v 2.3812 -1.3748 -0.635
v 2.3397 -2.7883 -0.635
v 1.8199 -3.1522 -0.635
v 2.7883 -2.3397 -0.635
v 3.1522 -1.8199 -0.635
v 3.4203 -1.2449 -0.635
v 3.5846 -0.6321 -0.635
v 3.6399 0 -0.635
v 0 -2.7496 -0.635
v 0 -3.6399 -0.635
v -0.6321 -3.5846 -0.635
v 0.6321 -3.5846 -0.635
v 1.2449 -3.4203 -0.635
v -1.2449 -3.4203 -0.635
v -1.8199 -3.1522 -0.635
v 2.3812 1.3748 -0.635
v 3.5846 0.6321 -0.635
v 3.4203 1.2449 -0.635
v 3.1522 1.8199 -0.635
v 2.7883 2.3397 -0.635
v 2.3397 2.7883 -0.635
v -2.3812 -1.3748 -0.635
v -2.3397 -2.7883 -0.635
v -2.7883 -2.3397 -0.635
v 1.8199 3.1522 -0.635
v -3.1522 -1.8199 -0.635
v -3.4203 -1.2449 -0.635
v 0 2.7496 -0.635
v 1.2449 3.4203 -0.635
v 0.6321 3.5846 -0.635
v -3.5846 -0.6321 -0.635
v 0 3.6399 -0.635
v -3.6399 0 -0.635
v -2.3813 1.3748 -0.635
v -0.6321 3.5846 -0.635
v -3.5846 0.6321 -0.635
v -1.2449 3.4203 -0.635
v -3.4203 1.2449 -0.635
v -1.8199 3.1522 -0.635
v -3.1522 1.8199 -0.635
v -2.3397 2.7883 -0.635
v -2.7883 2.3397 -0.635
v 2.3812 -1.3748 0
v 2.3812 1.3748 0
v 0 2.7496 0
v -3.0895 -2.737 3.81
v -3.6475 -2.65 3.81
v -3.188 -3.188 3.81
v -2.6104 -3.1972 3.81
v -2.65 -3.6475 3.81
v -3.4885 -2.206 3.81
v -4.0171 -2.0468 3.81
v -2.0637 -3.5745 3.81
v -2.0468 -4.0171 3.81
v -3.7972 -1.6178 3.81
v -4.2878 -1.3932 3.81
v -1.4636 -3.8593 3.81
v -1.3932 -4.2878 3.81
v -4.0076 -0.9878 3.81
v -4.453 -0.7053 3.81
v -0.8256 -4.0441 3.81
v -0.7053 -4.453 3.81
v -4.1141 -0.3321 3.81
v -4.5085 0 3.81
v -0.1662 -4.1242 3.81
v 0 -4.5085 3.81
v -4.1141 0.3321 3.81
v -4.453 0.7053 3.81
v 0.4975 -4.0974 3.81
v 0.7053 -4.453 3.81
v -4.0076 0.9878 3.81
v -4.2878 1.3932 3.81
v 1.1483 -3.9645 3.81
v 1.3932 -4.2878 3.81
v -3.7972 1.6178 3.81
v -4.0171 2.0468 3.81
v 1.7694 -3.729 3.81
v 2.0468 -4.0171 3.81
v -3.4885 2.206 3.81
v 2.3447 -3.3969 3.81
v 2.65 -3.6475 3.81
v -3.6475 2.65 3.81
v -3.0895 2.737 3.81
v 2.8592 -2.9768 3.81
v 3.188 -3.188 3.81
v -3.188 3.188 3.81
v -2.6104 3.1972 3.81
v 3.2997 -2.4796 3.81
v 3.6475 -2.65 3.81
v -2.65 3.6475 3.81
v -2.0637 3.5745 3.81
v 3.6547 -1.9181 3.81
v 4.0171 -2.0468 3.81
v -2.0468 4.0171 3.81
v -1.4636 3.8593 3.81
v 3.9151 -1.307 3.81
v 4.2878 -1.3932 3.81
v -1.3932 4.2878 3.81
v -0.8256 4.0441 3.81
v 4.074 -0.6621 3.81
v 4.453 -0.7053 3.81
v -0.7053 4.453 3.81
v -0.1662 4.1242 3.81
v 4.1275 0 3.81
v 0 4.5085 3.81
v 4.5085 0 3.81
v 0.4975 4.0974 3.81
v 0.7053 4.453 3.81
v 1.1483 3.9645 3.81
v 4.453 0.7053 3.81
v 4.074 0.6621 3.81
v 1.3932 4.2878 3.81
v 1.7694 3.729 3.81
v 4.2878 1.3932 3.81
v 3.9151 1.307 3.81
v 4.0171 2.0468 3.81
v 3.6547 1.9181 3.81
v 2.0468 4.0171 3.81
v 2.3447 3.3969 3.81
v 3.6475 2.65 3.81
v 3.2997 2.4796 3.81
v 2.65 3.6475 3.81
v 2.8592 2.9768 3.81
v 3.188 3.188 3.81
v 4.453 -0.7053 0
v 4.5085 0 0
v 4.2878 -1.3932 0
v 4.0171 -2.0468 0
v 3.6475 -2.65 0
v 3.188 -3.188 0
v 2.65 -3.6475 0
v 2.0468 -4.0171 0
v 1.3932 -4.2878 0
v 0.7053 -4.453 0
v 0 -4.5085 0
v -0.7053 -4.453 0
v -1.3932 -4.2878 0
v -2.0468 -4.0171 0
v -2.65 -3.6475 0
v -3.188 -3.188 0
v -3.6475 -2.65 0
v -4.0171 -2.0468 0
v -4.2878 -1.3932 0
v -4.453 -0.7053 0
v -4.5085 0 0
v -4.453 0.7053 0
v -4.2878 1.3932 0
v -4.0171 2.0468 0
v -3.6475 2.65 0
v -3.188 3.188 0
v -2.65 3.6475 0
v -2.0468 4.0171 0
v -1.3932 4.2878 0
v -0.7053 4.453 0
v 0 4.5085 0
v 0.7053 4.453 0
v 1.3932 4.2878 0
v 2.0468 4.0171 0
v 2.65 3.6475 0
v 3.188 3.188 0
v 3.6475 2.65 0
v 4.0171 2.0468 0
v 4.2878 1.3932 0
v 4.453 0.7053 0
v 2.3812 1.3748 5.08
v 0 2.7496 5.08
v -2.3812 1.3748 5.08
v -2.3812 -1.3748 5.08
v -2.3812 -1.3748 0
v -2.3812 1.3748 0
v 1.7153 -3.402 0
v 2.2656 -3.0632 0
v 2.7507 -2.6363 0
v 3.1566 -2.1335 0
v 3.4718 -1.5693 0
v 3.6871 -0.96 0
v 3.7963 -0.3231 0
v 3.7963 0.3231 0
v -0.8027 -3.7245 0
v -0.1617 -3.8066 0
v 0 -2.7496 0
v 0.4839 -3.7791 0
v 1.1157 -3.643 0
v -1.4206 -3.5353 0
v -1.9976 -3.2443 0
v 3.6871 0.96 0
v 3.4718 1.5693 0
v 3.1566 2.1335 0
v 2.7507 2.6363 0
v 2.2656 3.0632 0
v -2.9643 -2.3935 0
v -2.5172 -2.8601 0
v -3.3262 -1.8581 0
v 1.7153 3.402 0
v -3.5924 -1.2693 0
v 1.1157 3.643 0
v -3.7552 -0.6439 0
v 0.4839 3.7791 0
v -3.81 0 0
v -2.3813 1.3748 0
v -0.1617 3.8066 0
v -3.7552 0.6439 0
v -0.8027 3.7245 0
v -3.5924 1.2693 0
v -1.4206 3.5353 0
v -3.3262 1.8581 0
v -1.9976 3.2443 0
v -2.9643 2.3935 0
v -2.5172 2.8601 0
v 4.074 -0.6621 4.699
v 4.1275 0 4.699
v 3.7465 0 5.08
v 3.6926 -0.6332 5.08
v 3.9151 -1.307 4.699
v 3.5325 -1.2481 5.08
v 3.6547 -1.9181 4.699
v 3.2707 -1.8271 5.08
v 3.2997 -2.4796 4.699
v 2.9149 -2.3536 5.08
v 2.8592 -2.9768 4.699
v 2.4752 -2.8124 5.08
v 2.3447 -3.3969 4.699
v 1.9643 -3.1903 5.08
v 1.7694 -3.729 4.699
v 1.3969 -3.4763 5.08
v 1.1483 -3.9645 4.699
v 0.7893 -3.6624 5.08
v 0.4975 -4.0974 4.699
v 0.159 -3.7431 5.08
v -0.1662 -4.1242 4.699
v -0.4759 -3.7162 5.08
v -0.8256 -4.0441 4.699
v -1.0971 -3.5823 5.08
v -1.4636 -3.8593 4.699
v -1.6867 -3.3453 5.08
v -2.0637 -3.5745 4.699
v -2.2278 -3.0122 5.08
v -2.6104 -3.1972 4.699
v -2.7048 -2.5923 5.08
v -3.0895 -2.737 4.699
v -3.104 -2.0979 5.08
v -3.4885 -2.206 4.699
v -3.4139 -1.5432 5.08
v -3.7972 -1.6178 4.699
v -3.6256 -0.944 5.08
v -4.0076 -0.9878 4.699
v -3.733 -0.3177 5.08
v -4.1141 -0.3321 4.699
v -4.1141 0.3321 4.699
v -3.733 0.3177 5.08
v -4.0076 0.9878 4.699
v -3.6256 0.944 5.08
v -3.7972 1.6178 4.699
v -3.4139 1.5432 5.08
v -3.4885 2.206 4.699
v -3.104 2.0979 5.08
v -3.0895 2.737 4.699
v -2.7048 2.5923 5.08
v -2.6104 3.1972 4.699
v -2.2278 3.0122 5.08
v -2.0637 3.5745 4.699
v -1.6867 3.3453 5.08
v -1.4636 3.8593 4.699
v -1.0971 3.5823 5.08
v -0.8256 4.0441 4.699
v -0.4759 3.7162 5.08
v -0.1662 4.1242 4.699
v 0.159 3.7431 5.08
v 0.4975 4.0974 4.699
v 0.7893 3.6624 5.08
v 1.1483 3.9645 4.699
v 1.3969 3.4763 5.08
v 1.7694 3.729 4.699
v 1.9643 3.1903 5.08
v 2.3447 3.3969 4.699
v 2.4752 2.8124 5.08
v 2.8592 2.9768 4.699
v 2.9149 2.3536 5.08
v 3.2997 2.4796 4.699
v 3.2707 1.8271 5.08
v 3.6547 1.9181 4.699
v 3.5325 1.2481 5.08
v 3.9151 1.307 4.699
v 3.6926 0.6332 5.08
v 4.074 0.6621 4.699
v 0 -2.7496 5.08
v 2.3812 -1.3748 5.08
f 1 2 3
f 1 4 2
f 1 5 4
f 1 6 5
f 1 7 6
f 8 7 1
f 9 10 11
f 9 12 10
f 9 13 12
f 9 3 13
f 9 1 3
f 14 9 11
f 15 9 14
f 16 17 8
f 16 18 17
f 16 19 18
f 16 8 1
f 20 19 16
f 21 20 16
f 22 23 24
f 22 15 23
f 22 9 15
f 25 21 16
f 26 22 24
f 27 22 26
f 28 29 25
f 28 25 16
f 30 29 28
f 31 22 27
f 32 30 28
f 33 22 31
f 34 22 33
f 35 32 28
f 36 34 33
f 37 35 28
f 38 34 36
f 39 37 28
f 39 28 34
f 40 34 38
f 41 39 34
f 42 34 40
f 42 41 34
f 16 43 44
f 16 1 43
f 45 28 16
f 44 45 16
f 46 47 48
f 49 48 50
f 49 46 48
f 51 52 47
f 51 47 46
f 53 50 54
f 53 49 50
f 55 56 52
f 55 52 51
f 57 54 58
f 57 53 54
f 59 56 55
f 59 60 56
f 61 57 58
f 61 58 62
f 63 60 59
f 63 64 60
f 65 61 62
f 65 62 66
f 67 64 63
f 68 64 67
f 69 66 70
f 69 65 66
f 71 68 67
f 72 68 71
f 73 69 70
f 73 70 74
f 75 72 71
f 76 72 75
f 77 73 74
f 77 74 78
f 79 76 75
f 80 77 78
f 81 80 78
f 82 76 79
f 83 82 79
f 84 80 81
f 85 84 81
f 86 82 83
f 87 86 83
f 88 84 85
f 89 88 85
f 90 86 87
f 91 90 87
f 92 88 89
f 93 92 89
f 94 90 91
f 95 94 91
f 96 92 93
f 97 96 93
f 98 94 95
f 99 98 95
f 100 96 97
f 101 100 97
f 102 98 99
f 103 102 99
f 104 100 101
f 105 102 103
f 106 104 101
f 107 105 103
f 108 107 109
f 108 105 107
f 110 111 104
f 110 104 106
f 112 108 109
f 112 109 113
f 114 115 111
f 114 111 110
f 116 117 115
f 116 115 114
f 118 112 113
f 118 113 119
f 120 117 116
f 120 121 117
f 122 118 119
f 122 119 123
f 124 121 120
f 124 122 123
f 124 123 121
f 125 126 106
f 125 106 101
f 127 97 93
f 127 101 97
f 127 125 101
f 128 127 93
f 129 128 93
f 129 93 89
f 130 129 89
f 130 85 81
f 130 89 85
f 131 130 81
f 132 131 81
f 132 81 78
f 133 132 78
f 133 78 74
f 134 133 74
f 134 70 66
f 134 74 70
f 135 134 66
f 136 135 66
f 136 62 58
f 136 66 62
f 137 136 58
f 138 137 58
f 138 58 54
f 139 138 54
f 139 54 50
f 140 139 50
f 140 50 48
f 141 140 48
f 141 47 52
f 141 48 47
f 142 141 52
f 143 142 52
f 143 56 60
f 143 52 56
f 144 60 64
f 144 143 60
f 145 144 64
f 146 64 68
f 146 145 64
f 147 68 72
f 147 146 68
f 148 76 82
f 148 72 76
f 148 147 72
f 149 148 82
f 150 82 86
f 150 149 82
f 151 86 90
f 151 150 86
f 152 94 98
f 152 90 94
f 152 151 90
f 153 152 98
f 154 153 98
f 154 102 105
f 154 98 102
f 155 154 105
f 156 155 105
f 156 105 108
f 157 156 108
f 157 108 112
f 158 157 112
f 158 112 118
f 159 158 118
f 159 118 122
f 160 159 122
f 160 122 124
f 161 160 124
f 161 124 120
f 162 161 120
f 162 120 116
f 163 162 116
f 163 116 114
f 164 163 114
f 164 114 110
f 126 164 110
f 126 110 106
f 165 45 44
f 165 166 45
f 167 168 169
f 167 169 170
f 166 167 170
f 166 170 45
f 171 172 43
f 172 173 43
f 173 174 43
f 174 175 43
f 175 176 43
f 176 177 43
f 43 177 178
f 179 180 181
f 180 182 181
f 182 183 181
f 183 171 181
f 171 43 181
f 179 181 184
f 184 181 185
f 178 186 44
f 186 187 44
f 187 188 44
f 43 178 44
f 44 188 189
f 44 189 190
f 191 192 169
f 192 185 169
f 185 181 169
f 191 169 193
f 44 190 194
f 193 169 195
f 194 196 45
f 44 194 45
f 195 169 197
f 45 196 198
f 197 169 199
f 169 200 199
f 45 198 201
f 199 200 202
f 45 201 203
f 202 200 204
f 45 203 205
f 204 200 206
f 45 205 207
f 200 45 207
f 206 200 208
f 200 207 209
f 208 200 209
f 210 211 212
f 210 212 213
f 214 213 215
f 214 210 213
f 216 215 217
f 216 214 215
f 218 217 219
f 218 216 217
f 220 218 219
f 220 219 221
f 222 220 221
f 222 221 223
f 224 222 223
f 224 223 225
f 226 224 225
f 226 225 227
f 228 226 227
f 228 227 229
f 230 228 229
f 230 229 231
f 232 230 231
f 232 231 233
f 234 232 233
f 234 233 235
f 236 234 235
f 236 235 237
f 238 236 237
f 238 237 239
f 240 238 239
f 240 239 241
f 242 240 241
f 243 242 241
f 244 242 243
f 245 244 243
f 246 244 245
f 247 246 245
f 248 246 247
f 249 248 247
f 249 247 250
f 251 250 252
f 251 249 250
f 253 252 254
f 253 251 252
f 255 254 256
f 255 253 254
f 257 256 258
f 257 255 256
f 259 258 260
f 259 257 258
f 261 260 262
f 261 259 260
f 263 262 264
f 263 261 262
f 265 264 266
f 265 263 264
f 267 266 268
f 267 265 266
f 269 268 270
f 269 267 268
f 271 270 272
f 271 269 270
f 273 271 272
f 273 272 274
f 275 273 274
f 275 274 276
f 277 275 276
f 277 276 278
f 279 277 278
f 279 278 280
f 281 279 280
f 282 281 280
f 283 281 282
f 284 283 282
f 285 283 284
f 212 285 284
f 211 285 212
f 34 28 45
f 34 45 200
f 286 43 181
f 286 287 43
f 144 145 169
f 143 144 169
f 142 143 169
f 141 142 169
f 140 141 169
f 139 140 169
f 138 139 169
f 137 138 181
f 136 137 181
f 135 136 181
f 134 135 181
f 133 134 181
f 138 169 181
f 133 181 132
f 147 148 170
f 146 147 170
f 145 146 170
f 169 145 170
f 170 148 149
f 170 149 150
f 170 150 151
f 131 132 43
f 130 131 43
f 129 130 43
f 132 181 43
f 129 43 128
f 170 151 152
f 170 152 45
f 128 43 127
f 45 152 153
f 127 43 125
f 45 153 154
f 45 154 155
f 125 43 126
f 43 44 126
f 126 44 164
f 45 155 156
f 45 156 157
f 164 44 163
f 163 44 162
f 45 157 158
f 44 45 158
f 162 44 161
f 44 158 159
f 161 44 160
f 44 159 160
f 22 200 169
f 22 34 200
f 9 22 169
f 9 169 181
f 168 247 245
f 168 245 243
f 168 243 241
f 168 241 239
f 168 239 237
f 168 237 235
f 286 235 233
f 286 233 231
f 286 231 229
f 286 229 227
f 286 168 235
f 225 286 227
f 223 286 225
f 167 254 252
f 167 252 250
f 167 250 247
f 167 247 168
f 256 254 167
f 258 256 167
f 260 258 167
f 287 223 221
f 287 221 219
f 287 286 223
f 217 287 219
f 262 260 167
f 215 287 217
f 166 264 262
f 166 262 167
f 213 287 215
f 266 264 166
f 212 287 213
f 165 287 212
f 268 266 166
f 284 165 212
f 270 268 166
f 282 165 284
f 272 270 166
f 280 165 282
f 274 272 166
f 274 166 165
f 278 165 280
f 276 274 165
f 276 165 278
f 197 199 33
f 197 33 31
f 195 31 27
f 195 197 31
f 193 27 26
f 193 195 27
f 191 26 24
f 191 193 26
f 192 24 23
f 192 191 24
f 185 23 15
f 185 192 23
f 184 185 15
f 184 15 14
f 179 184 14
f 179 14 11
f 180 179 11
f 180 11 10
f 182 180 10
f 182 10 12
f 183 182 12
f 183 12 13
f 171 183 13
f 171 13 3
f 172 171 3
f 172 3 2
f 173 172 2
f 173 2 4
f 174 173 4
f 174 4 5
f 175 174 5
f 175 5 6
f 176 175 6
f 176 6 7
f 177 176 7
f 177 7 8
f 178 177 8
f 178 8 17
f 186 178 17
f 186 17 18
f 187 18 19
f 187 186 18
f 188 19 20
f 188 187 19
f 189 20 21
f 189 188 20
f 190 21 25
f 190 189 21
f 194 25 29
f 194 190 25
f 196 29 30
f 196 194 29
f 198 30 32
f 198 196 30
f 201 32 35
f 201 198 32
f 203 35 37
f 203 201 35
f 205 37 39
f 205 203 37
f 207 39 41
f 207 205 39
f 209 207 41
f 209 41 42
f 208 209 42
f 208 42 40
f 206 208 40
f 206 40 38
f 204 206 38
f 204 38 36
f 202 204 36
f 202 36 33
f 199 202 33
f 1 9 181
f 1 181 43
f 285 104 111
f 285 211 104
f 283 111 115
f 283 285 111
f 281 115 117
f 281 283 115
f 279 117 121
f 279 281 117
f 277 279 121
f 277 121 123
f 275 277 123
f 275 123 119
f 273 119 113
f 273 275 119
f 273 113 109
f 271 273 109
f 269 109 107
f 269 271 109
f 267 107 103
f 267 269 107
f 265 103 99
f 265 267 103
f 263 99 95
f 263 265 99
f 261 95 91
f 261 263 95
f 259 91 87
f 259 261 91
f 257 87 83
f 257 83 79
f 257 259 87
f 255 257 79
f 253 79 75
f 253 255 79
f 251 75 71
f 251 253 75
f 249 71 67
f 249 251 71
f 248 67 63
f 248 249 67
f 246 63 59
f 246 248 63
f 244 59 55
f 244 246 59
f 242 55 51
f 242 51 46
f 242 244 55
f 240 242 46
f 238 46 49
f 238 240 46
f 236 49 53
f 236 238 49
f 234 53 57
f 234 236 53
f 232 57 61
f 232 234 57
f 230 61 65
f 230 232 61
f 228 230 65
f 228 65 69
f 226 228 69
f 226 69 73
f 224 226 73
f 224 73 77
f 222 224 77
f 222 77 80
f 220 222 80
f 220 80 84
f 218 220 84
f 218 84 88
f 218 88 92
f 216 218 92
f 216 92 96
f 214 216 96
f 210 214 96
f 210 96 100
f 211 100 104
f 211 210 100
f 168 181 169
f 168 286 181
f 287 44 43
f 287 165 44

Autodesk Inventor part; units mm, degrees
ref_plane "YZ Plane" through (0, 0, 0) normal (1, 0, 0) x (0, 1, 0)
ref_plane "XZ Plane" through (0, 0, 0) normal (0, 1, 0) x (-1, 0, 0)
ref_plane "XY Plane" through (0, 0, 0) normal (0, 0, 1) x (1, 0, 0)
sketch "Sketch1" plane through (0, 0, 0) normal (0, 0, 1) x (1, 0, 0)
  circle A0 centre (0, 0) radius 4.5085
  dimension "d0" = 9.017
extrude "Extrusion1" add sketch "Sketch1" along normal blind 5.08
sketch "Sketch2" plane through (0, 0, 0) normal (0, 0, -1) x (-1, 0, 0)
  circle A0 centre (0, 0) radius 3.81
  dimension "d3" = 7.62
extrude "Extrusion2" add sketch "Sketch2" along normal blind 0.635 draft -15 separate body
sketch "Sketch3" plane through (0, 0, 5.08) normal (0, 0, 1) x (1, 0, 0)
  circle A0 centre (0, 0) radius 4.5085 projected
  circle A1 centre (0, 0) radius 4.5085 projected
  circle A2 centre (0, 0) radius 4.1275
  dimension "d6" = 8.255
extrude "Extrusion3" cut sketch "Sketch3" against normal blind 1.27 bodies 1
chamfer "Chamfer1" distance 0.381 angle 45 1 edges at (-4.1275, 0, 5.08)
sketch "Sketch4" plane through (0, 0, 5.08) normal (0, 0, 1) x (1, 0, 0)
  circle A0 centre (0, 0) radius 2.3813 construction
  circle A1 centre (0, 0) radius 4.1275 projected
  line L0 (2.3812, -1.3748) -> (0, -2.7496)
  line L1 (0, -2.7496) -> (-2.3812, -1.3748)
  line L2 (-2.3812, -1.3748) -> (-2.3812, 1.3748)
  line L3 (-2.3812, 1.3748) -> (0, 2.7496)
  line L4 (0, 2.7496) -> (2.3812, 1.3748)
  line L5 (2.3812, 1.3748) -> (2.3812, -1.3748)
  point P0 (2.3813, 0)
  dimension "d12" = 4.7625
extrude "Extrusion4" cut sketch "Sketch4" against normal blind 2540 contours L0 L1 L2 L3 L4 L5 bodies 1
thread "Thread1" size "3/8-36 UNS" class "2A" standard "ANSI Unified Screw Threads" full length
mirror "Mirror1" about plane through (0, 0, 0) normal (0, 0, 1) of "Extrusion4" bodies 1
sketch "Sketch6" plane through (0, 0, -0.635) normal (0, 0, -1) x (-1, 0, 0)
  line L0 (0, 2.7496) -> (-2.3812, 1.3748) projected
  line L1 (0, 2.7496) -> (2.3813, 1.3748)
  line L2 (2.3813, 1.3748) -> (2.3812, -1.3748)
  line L3 (2.3812, -1.3748) -> (0, -2.7496)
  line L4 (0, -2.7496) -> (-2.3812, -1.3748)
  line L5 (-2.3812, -1.3748) -> (-2.3813, 1.3748)
  line L6 (-2.3813, 1.3748) -> (0, 2.7496)
  point P0 (0, 0)
  point P1 (0, 0)
  point P2 (-1.1906, 2.0622)
extrude "Extrusion5" cut sketch "Sketch6" against normal blind 6.35 bodies 2
properties part number "Pillow Ball Retainer"
